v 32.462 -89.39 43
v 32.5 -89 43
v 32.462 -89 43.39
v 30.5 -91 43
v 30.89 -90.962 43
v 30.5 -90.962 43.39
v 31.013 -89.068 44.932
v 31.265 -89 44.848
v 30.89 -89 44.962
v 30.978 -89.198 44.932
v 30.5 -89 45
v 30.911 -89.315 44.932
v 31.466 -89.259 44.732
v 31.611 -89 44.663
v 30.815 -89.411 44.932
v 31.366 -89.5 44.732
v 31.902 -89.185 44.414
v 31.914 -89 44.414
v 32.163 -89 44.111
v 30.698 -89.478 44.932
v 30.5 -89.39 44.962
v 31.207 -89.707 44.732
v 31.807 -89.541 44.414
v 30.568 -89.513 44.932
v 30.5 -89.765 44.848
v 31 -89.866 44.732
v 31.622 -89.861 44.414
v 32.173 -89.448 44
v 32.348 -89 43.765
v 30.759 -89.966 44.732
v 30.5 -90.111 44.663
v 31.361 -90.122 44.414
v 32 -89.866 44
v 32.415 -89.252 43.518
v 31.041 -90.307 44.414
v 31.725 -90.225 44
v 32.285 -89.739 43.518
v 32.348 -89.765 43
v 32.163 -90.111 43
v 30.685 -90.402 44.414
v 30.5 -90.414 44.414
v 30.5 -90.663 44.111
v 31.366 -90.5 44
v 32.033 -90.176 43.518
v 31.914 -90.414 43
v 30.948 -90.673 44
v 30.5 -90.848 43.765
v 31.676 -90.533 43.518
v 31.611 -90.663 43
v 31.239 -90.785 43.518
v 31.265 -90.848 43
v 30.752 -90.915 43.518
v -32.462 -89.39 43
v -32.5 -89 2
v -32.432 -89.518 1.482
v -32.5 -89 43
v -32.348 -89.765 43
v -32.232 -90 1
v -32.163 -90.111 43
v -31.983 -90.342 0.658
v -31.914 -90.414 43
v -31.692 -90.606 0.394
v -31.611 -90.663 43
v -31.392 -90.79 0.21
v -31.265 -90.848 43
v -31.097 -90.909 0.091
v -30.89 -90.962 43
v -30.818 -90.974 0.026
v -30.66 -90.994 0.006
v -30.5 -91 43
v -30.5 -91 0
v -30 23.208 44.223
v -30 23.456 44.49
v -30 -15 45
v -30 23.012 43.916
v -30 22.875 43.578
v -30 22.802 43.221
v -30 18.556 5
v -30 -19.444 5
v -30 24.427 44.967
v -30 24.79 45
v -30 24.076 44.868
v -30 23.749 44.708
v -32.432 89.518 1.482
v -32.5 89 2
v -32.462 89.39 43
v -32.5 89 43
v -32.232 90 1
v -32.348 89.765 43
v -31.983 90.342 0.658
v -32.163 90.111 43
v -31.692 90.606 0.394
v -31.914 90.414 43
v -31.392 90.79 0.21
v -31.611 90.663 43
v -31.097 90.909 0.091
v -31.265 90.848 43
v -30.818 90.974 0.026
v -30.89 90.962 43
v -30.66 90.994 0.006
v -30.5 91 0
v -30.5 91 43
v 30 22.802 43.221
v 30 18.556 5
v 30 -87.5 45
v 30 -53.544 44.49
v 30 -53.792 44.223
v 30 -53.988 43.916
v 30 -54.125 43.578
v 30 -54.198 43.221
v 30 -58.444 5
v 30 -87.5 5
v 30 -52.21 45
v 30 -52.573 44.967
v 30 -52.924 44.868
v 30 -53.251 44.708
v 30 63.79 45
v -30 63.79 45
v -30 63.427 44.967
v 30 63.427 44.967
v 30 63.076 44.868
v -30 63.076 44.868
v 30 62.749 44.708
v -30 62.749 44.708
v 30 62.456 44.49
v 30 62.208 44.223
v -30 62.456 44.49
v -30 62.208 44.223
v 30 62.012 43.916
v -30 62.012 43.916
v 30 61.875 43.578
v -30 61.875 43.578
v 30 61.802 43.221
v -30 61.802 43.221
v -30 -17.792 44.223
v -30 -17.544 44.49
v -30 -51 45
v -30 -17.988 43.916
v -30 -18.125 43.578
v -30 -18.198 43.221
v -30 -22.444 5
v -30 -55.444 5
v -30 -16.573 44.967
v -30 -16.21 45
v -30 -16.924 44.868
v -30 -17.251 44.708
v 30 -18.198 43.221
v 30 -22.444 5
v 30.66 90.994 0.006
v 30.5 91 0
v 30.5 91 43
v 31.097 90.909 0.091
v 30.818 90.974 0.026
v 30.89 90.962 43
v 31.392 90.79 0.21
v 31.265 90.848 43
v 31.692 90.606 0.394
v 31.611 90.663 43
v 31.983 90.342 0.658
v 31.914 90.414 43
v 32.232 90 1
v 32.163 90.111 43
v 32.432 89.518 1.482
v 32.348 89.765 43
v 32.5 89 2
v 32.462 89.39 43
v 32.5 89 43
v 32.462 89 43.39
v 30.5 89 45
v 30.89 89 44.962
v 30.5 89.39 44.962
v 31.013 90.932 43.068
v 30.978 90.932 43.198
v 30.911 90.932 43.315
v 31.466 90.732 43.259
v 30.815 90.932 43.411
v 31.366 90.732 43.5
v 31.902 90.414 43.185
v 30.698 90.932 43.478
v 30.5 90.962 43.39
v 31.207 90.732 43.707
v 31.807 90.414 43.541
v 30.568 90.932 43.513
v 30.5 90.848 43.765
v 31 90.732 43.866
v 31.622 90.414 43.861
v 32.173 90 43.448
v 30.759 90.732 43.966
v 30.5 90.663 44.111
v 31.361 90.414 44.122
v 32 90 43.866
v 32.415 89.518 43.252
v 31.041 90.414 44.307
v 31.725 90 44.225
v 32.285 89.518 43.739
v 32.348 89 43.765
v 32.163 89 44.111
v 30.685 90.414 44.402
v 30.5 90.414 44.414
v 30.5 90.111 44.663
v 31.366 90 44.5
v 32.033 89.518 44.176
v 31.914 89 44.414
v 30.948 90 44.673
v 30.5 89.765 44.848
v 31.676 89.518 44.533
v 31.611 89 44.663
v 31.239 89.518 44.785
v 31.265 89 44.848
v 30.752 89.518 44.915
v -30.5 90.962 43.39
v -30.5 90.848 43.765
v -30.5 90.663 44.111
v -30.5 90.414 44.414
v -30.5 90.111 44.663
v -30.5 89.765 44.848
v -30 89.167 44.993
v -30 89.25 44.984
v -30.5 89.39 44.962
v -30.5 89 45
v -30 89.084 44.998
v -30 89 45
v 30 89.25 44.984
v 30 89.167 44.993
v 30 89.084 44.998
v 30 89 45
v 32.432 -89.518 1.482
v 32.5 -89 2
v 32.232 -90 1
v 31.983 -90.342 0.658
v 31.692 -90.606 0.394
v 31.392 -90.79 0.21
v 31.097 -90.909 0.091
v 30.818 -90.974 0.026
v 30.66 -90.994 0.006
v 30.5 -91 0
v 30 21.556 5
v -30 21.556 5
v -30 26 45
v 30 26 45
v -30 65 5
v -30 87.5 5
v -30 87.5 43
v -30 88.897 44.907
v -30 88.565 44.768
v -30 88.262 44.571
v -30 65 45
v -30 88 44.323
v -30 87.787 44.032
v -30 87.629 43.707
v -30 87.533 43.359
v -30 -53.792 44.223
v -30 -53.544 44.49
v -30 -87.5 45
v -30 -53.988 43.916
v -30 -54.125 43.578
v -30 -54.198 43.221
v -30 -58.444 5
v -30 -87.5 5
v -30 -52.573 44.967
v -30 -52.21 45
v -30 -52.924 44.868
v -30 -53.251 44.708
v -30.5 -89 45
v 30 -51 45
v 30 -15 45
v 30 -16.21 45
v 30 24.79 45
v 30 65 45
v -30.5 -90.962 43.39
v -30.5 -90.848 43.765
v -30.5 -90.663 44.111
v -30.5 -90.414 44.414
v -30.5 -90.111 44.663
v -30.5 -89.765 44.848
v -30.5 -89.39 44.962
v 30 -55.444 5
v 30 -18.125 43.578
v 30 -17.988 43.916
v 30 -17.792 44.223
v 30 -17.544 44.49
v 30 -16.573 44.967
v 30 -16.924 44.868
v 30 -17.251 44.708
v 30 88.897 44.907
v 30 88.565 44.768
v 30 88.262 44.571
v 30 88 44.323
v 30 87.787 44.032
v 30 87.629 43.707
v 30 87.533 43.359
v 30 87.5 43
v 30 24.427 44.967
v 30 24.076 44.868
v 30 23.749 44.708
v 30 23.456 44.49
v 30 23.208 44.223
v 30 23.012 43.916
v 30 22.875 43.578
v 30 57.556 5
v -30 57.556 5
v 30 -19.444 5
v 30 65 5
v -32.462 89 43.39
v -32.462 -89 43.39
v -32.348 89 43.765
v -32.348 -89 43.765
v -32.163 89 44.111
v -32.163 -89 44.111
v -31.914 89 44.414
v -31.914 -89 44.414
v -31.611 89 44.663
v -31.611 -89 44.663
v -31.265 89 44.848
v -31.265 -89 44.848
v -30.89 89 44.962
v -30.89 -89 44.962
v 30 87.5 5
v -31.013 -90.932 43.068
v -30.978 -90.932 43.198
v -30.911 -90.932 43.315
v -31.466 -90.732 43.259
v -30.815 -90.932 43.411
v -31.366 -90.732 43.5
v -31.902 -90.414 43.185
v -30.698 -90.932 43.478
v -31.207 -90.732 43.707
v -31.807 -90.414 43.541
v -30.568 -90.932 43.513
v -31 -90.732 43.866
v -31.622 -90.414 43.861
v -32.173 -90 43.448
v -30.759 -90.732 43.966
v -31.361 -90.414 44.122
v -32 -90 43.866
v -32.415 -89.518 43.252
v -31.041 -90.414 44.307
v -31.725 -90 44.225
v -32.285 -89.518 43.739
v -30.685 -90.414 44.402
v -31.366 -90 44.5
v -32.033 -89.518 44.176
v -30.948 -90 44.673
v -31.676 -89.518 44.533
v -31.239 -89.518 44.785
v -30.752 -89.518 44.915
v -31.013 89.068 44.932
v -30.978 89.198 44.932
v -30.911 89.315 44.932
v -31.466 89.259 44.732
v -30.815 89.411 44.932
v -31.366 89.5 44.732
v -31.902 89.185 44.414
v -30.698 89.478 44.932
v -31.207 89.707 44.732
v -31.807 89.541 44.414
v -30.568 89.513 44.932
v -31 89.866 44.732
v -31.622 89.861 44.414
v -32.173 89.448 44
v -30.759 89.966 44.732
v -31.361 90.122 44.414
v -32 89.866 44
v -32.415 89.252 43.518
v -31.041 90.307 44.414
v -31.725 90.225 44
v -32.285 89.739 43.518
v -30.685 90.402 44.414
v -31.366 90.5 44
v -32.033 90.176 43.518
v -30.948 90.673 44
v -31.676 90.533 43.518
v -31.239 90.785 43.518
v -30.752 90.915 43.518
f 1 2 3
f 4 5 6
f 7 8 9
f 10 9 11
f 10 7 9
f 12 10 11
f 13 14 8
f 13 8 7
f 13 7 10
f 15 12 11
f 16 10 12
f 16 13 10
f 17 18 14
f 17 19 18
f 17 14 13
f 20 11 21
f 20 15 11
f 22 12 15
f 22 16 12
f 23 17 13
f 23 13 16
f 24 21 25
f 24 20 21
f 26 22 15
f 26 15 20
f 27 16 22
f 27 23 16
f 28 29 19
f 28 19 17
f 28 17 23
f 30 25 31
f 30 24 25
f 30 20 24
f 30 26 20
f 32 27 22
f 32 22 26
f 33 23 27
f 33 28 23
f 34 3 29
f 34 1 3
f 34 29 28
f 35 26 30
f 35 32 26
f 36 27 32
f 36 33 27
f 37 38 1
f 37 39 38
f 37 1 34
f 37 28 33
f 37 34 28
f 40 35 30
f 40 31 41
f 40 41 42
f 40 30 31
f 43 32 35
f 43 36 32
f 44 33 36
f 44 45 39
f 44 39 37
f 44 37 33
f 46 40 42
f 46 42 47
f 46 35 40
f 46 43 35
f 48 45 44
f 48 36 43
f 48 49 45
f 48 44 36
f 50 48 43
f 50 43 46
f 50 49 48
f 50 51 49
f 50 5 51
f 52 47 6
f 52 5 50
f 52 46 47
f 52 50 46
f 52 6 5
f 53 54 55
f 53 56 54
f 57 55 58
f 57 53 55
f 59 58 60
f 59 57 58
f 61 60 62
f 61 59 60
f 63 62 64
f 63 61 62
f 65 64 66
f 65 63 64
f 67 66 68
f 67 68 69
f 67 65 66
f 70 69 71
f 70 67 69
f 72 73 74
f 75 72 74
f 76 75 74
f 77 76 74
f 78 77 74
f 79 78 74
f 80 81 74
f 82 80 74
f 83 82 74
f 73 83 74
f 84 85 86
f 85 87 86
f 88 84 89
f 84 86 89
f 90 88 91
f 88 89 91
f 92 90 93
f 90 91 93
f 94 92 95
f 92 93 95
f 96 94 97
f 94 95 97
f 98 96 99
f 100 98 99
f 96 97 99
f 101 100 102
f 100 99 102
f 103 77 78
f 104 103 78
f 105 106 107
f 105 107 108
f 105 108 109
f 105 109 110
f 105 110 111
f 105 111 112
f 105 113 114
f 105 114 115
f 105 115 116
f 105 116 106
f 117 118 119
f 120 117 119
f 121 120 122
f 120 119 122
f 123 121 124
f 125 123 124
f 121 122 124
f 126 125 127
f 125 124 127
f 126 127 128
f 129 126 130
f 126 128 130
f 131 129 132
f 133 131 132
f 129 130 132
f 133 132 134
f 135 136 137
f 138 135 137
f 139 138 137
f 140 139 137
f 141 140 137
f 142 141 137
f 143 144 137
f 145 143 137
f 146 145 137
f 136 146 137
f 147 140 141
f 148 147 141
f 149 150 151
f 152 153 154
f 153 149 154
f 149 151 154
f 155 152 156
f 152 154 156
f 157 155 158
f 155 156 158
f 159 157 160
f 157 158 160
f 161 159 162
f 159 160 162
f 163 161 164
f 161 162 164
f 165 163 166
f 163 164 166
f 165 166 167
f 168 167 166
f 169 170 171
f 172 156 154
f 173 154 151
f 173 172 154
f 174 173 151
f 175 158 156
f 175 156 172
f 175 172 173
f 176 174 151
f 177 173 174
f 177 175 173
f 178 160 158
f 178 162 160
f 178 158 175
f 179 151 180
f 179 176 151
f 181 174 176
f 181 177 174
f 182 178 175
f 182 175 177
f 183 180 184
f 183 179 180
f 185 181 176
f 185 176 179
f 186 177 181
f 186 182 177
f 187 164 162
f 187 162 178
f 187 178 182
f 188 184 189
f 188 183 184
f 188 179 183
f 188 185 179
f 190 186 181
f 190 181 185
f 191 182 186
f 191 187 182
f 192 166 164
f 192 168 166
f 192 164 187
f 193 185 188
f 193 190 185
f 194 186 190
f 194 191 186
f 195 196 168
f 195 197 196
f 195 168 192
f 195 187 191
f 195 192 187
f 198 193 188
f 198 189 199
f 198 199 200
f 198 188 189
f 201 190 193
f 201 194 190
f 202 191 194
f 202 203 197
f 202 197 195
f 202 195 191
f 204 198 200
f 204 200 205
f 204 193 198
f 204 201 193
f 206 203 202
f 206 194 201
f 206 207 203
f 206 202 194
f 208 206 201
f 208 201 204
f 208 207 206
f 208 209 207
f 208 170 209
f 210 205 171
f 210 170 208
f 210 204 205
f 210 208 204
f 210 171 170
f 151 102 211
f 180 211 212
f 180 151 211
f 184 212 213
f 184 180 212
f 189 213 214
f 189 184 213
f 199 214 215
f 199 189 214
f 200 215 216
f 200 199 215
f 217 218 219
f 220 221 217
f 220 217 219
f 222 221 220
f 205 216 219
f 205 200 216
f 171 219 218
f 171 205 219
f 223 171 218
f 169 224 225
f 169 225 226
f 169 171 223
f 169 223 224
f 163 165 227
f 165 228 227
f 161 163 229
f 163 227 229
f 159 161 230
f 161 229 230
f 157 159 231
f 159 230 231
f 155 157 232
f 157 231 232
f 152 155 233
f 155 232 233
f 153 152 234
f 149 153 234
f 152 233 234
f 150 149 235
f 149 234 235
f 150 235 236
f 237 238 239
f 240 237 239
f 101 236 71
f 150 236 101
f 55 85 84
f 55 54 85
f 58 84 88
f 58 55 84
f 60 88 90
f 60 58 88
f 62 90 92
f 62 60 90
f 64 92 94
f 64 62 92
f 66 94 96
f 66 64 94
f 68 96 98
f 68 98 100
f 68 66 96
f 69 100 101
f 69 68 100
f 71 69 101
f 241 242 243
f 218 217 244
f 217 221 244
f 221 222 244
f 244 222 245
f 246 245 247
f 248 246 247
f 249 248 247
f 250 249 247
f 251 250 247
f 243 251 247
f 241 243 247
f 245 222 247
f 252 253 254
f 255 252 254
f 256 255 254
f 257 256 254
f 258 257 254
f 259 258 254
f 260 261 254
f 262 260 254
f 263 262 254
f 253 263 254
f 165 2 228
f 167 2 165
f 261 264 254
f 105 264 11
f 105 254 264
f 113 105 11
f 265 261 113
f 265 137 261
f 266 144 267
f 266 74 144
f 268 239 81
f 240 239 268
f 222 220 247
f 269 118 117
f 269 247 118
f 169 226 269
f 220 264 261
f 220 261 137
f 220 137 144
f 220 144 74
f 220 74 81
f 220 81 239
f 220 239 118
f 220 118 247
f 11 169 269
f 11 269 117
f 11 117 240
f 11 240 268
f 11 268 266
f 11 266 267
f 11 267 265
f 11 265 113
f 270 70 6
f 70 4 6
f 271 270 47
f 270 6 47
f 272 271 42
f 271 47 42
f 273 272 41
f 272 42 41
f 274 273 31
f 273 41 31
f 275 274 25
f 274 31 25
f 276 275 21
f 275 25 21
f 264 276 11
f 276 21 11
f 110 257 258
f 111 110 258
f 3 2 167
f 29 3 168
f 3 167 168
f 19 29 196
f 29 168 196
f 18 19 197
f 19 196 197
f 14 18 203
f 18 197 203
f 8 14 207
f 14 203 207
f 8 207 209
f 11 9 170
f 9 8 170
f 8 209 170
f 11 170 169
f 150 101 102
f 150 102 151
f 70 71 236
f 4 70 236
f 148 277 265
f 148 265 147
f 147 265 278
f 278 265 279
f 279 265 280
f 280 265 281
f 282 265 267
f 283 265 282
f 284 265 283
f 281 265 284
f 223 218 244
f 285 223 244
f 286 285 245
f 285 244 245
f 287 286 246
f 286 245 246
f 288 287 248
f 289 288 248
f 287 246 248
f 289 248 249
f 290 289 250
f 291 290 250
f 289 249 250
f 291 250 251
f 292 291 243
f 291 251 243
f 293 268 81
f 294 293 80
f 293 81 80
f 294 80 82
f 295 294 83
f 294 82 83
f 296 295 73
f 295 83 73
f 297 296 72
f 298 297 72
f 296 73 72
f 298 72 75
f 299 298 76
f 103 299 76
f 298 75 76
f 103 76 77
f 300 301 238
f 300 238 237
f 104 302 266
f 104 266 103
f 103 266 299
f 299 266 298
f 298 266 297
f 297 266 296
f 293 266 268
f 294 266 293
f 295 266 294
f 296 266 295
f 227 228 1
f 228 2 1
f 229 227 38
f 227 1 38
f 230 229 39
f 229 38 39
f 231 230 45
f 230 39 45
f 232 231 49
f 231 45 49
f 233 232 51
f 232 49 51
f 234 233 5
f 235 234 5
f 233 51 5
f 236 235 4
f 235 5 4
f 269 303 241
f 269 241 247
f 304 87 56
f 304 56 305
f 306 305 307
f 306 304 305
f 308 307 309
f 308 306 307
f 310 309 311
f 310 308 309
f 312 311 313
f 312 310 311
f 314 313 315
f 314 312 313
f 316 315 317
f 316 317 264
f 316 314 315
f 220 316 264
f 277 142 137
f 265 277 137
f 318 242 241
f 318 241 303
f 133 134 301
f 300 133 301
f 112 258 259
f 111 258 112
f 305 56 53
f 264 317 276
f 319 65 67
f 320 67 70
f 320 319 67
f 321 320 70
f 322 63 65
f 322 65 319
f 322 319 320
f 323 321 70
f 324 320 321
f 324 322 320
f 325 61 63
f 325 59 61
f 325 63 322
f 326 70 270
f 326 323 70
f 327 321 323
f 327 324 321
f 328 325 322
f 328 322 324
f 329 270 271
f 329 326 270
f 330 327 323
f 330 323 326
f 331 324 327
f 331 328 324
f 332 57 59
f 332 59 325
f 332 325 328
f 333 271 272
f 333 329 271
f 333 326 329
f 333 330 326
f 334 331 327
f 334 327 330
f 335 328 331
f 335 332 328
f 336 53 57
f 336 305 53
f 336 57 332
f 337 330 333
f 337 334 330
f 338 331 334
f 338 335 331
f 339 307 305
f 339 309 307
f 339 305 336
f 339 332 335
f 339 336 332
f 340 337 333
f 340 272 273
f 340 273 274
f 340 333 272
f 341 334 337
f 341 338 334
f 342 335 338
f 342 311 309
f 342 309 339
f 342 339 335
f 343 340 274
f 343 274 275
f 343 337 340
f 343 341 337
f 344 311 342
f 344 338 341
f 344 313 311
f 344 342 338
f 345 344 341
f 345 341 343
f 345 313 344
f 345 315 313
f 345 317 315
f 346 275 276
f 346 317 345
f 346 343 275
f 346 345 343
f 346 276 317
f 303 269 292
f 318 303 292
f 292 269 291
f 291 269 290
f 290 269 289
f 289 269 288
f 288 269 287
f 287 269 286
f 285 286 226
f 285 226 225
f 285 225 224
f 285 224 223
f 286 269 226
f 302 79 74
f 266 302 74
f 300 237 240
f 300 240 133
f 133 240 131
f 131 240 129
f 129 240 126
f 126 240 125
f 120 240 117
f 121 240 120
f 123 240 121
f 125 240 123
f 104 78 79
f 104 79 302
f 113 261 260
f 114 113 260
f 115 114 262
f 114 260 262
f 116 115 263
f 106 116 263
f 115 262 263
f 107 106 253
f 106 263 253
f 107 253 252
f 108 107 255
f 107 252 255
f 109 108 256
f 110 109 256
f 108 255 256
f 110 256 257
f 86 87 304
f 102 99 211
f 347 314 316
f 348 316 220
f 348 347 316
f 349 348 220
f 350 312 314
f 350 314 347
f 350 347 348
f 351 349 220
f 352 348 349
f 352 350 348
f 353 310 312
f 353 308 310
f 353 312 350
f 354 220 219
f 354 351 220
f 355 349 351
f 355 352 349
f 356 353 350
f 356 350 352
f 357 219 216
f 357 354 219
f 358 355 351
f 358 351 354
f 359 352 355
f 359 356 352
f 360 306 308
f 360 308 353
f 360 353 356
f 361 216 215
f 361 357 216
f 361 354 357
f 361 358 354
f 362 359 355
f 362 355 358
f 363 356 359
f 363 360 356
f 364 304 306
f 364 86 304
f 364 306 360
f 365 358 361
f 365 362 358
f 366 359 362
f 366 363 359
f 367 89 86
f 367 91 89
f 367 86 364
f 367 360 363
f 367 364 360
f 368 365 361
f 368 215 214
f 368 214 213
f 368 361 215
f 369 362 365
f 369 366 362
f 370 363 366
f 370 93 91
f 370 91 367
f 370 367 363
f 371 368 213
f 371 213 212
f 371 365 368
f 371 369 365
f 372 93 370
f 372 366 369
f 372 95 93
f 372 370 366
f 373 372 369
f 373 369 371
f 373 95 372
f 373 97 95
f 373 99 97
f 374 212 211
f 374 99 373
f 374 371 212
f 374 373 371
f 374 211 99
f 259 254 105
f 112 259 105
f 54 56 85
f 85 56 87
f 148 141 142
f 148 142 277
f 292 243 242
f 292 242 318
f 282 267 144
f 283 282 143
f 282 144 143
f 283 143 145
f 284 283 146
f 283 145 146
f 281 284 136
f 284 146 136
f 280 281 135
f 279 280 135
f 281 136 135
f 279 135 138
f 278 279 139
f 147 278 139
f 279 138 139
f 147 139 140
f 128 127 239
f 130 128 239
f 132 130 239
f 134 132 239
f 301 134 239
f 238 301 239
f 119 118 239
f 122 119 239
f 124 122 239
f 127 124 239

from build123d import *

# Parameters (mm, degrees)
F0_W        = 65
F0_H        = 182
F1_DEPTH    = 45
F2_W        = 60
F2_H        = 175
F3_DEPTH    = 40
F5_DEPTH    = 65
F6_R        = 2
F7_T1_DEPTH = 60


# Not quite as in the source:
# - a fillet or chamfer that OpenCascade refuses, or shapes differently, is made with other operations: its cross-section is extruded or revolved along the edge and cut away or added


with BuildPart() as f1:
    # F0 (on Top) → F1 (new body)
    with BuildSketch(Plane.XY):
        Rectangle(F0_W, F0_H)
    extrude(amount=F1_DEPTH)

    # F2 (on face) → F3 (cut)
    with BuildSketch(Plane.XY.offset(45)):
        Rectangle(F2_W, F2_H)
    extrude(amount=-F3_DEPTH, mode=Mode.SUBTRACT)

    # F4 (on face) → F5 (join)
    with BuildSketch(Plane.YZ.offset(32.5)):
        Polygon((-51, 45), (-54, 45), (-59, 0), (-56, 0), align=None)
        Polygon((-15, 45), (-18, 45), (-23, 0), (-20, 0), align=None)
        Polygon((26, 45), (23, 45), (18, 0), (21, 0), align=None)
        Polygon((65, 45), (62, 45), (57, 0), (65, 0), align=None)
    extrude(amount=-F5_DEPTH)

    # F6
    f6_edges = [f1.edges().sort_by_distance(p)[0] for p in [
        (-32.5, 0, 0),
        (-32.5, 91, 22.5),
        (-32.5, 0, 45),
        (-32.5, -91, 22.5),
        (32.5, 0, 0),
        (32.5, -91, 22.5),
        (32.5, 0, 45),
        (32.5, 91, 22.5),
        (0, -91, 45),
        (0, 91, 45),
    ]]
    fillet(f6_edges, radius=F6_R)

    # F7: fillet of radius 2 on 5 edges, made by hand

    # F7_s2 → F7_t1 (cut)
    with BuildSketch(Plane.YZ.offset(-30)):
        with BuildLine():
            ThreePointArc((-52.2099144137, 45), (-53.5437573385, 44.4902560358), (-54.1976818831, 43.2208630521))
            Line((-54.1976818831, 43.2208630521), (-54, 45))
            Line((-54, 45), (-52.2099144137, 45))
        make_face()
        with BuildLine():
            ThreePointArc((-16.2099144137, 45), (-17.5437573385, 44.4902560358), (-18.1976818831, 43.2208630521))
            Line((-18.1976818831, 43.2208630521), (-18, 45))
            Line((-18, 45), (-16.2099144137, 45))
        make_face()
        with BuildLine():
            ThreePointArc((24.7900855863, 45), (23.4562426615, 44.4902560358), (22.8023181169, 43.2208630521))
            Line((22.8023181169, 43.2208630521), (23, 45))
            Line((23, 45), (24.7900855863, 45))
        make_face()
        with BuildLine():
            ThreePointArc((63.7900855863, 45), (62.4562426615, 44.4902560358), (61.8023181169, 43.2208630521))
            Line((61.8023181169, 43.2208630521), (62, 45))
            Line((62, 45), (63.7900855863, 45))
        make_face()
        with BuildLine():
            ThreePointArc((89.5, 45), (88.0857864376, 44.4142135624), (87.5, 43))
            Line((87.5, 43), (87.5, 45))
            Line((87.5, 45), (89.5, 45))
        make_face()
    extrude(amount=F7_T1_DEPTH, mode=Mode.SUBTRACT)


solid = f1.part
